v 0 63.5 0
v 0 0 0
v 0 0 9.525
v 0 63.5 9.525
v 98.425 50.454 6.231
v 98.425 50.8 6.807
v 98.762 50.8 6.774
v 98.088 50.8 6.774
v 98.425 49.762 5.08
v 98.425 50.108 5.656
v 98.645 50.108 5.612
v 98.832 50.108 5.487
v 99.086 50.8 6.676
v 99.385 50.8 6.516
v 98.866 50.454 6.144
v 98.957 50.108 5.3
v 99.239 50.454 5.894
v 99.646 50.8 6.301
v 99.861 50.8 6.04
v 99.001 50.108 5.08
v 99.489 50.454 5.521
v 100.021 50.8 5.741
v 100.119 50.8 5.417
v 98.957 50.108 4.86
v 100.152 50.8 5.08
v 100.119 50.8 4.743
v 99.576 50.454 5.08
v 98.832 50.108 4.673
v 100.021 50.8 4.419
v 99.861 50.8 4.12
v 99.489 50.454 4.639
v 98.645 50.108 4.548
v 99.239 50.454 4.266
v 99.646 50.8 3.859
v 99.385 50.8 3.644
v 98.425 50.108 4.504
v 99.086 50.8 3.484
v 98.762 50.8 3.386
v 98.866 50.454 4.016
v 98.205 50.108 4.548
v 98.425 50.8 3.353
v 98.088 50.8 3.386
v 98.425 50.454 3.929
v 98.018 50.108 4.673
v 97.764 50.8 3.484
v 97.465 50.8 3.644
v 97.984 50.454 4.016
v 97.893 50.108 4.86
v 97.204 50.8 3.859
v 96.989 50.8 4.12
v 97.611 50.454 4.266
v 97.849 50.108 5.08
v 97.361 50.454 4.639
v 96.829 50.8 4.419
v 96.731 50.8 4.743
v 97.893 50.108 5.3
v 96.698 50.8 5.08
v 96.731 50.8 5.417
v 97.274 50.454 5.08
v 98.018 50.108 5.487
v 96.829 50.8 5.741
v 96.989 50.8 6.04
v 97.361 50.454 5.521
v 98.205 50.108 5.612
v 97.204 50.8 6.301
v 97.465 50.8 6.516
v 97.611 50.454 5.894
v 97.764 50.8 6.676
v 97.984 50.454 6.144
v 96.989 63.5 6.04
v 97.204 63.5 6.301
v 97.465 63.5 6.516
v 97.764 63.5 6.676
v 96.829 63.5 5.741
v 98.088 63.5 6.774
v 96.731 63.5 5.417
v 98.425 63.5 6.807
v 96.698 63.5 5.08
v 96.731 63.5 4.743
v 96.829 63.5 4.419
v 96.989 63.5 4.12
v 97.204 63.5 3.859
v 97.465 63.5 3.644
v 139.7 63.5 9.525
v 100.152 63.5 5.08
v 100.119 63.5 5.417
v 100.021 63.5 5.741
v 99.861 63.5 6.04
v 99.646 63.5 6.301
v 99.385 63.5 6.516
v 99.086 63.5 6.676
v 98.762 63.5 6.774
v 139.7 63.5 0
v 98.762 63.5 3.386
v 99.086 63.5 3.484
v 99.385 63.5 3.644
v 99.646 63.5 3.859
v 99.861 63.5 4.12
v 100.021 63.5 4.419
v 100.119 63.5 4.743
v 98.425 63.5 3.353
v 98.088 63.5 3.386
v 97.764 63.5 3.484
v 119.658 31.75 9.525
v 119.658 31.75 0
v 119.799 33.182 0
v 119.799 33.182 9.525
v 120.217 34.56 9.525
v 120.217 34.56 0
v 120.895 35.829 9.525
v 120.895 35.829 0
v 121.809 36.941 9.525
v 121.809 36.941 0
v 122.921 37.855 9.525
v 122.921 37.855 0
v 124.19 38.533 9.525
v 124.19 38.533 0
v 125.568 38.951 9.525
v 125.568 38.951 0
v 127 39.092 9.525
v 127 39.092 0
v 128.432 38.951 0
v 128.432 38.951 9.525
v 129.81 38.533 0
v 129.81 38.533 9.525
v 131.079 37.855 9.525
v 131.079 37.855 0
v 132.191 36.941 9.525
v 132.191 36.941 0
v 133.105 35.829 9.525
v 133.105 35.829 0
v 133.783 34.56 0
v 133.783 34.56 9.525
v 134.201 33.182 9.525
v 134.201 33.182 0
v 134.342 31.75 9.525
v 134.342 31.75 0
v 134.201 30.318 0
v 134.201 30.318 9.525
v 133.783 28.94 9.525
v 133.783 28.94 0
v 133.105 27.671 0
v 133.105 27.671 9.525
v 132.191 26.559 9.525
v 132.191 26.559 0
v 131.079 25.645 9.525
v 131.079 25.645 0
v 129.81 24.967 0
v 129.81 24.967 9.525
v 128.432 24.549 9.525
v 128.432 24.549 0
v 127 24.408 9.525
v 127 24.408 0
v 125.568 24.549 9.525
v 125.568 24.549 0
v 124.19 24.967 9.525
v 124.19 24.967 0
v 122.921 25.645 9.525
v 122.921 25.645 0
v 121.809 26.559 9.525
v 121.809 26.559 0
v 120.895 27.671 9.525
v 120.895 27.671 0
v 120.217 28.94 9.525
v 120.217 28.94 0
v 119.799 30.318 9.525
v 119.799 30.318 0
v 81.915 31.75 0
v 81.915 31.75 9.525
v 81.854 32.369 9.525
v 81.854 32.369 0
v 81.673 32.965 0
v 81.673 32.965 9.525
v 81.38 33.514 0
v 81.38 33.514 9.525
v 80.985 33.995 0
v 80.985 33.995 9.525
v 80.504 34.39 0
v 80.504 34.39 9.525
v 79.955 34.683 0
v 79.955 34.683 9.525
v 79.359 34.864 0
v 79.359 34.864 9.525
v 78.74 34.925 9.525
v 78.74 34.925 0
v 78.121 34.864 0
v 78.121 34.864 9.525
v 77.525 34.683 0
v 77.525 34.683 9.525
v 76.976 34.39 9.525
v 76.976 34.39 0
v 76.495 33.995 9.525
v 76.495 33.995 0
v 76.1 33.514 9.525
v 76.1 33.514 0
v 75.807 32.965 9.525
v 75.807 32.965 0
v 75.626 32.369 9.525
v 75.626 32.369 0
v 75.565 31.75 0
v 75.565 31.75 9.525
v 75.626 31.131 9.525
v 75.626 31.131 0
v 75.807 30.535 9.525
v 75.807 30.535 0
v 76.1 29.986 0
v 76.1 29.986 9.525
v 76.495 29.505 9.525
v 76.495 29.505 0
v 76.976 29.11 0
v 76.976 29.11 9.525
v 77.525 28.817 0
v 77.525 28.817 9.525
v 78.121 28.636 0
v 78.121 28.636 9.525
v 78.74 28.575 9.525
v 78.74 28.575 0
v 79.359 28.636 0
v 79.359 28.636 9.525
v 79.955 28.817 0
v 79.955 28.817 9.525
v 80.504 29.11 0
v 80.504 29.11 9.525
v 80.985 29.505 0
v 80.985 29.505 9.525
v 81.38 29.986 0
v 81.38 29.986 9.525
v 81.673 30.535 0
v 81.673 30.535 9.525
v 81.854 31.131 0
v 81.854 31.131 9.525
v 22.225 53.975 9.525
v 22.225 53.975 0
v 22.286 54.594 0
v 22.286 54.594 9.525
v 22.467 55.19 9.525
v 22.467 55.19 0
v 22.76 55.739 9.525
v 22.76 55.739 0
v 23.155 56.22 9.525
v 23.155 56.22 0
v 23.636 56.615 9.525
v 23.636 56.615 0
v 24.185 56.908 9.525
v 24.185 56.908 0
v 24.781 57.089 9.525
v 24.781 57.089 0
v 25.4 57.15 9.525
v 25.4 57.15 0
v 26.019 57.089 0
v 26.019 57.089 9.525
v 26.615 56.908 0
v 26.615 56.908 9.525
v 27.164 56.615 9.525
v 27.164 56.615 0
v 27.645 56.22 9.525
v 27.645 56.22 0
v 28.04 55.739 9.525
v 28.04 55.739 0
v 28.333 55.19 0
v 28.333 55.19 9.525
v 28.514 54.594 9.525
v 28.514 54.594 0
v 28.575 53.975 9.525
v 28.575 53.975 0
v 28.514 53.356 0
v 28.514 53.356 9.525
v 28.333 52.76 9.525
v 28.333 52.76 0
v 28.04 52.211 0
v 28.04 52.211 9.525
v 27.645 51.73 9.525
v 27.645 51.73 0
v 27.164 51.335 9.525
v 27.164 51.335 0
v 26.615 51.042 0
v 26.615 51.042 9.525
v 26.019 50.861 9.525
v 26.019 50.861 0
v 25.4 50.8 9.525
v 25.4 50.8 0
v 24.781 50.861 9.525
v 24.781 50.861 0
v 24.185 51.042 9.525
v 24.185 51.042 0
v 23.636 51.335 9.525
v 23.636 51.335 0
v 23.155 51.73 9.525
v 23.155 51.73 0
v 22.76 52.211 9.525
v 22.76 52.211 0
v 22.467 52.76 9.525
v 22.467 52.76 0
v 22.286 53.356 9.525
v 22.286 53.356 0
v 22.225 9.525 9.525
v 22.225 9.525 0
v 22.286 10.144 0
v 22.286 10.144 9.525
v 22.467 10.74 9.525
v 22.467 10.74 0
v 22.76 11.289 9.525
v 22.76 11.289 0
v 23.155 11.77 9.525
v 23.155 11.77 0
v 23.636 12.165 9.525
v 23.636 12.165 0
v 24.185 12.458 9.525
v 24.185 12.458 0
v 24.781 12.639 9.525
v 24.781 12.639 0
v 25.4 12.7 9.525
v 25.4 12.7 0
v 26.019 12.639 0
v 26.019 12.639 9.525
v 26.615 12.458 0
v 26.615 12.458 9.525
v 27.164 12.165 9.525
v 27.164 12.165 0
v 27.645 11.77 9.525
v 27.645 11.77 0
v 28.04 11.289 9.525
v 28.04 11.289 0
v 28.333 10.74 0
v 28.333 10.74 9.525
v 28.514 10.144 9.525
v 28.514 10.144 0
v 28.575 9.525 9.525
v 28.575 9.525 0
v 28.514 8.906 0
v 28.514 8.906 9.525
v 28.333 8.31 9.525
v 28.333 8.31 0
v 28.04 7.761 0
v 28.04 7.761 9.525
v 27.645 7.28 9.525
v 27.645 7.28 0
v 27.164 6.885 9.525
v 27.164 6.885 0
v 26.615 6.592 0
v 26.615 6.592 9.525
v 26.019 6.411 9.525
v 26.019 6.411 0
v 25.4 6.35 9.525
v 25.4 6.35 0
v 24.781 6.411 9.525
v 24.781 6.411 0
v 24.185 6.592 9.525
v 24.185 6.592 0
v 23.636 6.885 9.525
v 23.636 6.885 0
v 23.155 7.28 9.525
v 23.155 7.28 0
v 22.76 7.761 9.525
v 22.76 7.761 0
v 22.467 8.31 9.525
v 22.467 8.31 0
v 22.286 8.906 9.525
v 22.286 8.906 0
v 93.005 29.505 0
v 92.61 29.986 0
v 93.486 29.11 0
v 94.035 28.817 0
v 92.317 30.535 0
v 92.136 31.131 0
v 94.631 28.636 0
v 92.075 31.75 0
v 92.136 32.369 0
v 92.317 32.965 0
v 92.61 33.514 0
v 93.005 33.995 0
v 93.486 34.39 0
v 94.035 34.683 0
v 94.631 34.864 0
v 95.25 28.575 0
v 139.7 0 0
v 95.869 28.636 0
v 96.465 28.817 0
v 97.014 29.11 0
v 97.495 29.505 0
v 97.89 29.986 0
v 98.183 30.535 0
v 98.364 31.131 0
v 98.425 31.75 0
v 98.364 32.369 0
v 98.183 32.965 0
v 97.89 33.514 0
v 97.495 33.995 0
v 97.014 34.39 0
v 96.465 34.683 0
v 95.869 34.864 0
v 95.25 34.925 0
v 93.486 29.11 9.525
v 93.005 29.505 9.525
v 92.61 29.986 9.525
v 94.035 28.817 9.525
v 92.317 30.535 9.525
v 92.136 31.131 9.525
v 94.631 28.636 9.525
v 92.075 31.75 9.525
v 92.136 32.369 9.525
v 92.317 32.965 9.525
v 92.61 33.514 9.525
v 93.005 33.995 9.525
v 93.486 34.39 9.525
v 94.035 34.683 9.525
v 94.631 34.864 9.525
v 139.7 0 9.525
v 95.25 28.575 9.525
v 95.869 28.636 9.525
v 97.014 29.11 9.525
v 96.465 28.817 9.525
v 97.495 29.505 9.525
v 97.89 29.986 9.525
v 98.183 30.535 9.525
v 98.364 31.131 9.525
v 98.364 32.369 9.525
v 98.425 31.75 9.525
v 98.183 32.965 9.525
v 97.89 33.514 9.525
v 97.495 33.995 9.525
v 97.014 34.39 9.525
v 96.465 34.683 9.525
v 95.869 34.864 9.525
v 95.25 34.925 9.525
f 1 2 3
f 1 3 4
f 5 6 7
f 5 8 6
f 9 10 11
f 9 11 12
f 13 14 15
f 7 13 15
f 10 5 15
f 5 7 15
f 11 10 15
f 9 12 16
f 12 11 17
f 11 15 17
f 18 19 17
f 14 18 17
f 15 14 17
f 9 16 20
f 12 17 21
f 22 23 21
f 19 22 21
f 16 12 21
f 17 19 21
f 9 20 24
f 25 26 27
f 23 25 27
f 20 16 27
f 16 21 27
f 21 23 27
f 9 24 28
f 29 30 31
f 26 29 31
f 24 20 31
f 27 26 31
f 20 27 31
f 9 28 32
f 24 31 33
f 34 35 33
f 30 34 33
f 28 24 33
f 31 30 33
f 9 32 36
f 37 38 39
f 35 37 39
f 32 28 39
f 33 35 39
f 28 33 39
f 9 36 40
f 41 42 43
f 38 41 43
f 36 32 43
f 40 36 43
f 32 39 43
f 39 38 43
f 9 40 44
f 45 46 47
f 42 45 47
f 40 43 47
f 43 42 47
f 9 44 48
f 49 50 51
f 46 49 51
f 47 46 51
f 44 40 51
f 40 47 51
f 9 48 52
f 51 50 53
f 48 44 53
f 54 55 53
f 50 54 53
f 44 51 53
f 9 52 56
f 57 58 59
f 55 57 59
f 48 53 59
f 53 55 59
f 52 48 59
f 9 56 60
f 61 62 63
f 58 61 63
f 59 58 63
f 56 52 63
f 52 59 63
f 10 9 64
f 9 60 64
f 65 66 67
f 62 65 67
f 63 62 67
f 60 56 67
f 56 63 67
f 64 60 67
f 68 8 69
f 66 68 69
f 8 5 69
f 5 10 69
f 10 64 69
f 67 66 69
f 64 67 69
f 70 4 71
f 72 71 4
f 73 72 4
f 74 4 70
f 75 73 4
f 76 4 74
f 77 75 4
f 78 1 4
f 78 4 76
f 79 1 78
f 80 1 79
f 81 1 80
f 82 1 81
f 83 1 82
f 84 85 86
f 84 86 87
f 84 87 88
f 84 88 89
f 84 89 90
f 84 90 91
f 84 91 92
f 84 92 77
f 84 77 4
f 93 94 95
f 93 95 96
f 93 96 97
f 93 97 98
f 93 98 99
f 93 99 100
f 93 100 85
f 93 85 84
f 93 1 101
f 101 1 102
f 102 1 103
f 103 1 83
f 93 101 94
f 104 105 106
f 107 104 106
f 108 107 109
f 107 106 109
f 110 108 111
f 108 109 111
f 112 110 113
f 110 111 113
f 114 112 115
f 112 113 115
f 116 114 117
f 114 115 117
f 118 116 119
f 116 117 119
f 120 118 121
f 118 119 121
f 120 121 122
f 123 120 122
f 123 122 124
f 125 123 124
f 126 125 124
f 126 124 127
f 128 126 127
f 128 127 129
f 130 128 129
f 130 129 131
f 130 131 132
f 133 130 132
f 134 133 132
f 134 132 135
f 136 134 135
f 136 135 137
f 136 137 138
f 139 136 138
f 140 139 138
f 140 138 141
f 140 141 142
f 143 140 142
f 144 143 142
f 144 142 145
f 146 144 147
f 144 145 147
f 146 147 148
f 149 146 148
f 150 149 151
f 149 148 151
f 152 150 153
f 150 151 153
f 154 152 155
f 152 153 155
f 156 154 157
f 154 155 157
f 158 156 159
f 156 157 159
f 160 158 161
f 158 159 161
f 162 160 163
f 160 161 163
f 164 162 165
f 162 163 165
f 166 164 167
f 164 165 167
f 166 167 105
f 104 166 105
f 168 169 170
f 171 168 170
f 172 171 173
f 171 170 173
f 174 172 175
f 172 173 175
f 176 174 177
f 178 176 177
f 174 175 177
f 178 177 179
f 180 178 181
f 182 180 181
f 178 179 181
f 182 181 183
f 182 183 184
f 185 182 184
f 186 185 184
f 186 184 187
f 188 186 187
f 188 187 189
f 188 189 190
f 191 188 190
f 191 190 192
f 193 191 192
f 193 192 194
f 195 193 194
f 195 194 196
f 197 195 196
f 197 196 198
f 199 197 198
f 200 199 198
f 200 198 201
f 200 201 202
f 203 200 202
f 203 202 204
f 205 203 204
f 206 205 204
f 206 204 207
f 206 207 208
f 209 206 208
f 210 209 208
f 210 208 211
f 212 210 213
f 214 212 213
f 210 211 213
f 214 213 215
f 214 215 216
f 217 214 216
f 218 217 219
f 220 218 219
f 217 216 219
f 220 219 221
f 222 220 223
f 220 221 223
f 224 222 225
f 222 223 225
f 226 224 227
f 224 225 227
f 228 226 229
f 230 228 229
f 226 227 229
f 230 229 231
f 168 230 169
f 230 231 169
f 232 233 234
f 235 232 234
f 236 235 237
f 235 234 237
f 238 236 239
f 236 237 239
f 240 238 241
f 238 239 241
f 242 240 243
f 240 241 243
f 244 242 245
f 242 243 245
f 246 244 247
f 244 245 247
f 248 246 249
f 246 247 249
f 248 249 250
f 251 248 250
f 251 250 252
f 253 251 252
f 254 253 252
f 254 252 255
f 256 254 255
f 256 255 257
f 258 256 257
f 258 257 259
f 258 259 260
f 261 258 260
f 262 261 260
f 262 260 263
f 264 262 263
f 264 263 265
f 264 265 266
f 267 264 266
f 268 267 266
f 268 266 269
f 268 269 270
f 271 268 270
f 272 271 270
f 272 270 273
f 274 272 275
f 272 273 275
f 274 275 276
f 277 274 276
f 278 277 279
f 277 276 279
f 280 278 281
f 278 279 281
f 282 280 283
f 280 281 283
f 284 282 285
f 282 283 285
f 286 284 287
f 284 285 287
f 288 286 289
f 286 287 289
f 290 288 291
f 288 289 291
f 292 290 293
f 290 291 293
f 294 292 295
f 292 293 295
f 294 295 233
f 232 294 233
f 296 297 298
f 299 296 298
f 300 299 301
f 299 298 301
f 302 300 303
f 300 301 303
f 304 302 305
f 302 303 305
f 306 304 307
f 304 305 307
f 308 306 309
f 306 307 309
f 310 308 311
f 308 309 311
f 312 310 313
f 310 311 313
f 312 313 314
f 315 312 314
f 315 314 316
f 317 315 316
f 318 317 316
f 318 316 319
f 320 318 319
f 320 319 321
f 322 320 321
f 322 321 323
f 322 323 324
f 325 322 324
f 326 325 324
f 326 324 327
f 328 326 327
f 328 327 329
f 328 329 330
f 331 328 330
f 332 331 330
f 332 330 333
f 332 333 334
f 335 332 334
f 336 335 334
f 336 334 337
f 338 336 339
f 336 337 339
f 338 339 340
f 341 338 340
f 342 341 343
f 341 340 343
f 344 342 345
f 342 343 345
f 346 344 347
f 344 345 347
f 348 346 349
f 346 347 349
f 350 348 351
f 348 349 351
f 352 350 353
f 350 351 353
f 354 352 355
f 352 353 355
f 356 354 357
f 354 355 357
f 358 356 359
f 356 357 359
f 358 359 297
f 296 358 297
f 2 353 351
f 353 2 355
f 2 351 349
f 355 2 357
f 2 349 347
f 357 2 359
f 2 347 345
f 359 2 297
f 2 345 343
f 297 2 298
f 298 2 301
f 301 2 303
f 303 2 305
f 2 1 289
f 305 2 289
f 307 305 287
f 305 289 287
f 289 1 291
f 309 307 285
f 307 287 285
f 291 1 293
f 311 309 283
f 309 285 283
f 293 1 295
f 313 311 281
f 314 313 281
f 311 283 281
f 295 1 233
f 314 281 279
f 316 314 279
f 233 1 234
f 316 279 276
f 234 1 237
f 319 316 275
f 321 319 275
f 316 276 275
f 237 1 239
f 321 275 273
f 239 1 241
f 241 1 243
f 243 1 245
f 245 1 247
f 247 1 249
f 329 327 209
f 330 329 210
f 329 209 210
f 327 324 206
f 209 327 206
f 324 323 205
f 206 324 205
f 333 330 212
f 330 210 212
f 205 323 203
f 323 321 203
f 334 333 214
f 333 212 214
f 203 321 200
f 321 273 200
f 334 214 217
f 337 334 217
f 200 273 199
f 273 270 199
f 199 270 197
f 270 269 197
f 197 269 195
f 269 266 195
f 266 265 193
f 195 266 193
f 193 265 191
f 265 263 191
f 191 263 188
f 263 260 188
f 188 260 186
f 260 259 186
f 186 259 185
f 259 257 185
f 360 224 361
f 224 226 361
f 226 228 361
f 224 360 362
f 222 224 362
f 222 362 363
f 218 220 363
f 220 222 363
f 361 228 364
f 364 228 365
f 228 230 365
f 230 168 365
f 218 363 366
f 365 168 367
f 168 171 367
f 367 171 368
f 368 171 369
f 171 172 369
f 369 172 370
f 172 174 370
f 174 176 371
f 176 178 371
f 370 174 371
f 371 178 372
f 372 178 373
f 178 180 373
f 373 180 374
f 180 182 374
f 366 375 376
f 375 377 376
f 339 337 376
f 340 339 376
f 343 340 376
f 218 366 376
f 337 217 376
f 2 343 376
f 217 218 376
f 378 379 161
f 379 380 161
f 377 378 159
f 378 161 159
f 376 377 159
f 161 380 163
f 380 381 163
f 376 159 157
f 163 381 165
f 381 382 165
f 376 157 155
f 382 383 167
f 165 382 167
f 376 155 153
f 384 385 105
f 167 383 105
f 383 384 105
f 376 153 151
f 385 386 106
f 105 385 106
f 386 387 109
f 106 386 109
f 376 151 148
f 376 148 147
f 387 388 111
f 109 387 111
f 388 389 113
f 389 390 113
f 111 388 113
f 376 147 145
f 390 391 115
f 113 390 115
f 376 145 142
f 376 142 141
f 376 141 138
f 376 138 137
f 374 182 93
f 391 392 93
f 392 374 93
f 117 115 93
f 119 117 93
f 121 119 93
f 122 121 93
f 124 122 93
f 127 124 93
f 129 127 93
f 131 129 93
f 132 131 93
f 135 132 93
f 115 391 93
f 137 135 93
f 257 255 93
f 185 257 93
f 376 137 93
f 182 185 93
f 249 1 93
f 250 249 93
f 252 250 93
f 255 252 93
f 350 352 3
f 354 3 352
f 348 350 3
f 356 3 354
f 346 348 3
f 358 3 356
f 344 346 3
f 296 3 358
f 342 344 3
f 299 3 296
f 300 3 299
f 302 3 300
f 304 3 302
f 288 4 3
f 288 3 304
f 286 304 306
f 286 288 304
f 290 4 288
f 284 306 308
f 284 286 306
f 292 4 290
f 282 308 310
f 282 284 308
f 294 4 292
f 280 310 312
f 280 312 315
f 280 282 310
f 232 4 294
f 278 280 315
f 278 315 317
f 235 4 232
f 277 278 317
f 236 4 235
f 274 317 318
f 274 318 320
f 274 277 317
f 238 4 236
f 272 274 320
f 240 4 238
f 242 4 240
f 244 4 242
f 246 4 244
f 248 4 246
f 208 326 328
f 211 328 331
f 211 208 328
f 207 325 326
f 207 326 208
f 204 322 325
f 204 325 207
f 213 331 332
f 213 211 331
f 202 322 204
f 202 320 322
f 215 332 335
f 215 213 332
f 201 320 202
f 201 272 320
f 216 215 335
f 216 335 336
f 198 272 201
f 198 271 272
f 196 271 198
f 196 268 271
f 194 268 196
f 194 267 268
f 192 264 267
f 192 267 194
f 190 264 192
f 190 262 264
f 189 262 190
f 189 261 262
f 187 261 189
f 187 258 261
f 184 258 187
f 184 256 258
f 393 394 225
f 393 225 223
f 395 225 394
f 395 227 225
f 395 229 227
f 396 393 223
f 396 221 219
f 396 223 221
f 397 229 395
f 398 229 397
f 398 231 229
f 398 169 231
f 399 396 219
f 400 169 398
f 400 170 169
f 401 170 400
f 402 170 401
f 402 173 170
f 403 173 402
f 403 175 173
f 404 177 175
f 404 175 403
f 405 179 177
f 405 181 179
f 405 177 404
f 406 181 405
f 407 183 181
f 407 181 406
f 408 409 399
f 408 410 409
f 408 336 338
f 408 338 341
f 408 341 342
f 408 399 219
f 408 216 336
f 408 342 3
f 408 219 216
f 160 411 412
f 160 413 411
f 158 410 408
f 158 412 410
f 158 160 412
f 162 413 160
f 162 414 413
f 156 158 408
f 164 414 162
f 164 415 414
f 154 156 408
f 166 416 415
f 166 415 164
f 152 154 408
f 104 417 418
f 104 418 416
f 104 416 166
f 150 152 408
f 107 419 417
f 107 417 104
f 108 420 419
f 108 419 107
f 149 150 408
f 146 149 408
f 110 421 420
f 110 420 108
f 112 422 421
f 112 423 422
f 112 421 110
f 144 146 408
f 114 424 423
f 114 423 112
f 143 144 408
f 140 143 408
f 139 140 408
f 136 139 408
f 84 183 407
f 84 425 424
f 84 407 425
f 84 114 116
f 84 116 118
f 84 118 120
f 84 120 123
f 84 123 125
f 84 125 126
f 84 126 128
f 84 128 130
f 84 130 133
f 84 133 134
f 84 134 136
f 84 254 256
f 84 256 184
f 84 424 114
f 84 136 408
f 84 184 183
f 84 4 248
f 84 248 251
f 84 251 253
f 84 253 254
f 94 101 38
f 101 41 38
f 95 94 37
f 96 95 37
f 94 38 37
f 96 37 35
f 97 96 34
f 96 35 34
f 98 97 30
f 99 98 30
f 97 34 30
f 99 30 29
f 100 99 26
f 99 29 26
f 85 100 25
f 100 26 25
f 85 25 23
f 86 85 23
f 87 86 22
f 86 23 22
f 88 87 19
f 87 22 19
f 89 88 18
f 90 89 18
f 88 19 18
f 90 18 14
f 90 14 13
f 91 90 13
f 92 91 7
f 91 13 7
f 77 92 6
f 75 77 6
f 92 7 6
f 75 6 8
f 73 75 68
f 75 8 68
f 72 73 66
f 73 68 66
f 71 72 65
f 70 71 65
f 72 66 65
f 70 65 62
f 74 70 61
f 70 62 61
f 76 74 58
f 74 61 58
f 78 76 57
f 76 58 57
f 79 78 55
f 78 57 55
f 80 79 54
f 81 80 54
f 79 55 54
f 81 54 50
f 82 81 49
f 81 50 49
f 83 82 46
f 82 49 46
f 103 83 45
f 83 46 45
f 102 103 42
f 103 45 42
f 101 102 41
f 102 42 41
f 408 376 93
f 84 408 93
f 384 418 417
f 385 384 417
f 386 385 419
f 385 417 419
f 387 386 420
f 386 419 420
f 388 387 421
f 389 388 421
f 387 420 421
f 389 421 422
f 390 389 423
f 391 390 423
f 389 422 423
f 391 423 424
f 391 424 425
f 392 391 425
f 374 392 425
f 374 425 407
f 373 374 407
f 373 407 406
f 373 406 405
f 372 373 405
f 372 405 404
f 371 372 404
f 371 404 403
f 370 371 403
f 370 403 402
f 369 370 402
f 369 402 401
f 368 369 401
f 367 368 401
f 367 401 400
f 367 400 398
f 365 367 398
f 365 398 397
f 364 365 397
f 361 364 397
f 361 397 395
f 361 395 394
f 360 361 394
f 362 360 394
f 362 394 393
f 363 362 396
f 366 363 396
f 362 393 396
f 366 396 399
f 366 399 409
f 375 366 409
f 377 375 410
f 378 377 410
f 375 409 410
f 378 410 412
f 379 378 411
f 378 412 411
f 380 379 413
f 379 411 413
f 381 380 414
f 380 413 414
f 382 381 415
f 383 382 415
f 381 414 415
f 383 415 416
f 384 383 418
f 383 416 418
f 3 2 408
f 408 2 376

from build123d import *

# Parameters (mm, degrees)
SKETCH1_W                   = 139.7
SKETCH1_H                   = 63.5
BOSS_EXTRUDE1_DEPTH         = 9.525
F_5_8_18_TAPPED_HOLE1_D     = 14.68374
F_1_4_0_25_DIAMETER_HOLE1_D = 6.35
F_8_32_TAPPED_HOLE1_D       = 3.4544
F_8_32_TAPPED_HOLE1_DEPTH   = 12.7
F_8_32_TAPPED_HOLE1_TIP     = 1.037806461
SKETCH9_R                   = 3.175
CUT_EXTRUDE1_DEPTH          = 10.525


with BuildPart() as part:
    # Sketch1 → Boss-Extrude1 (new body)
    with BuildSketch(Plane.XY):
        with Locations((69.85, 31.75)):
            Rectangle(SKETCH1_W, SKETCH1_H)
    extrude(amount=BOSS_EXTRUDE1_DEPTH)

    # 5/8-18 Tapped Hole1 (through all)
    with Locations(Plane.XY.offset(9.525)):
        with Locations((127, 31.75)):
            Hole(F_5_8_18_TAPPED_HOLE1_D / 2)

    # 1/4 (0.25) Diameter Hole1 (through all)
    with Locations(Plane(origin=(25.4, 53.975, 9.525), x_dir=(1, 0, 0), z_dir=(0, 0, 1))):
        with Locations((0, 0), (0, -44.45)):
            Hole(F_1_4_0_25_DIAMETER_HOLE1_D / 2)

    # #8-32 Tapped Hole1
    with Locations(Plane(origin=(98.425, 63.5, 5.08), x_dir=(0, 0, 1), z_dir=(0, 1, 0))):
        with Locations((0, 0)):
            Hole(F_8_32_TAPPED_HOLE1_D / 2, depth=F_8_32_TAPPED_HOLE1_DEPTH)
            with Locations((0, 0, -(F_8_32_TAPPED_HOLE1_DEPTH + F_8_32_TAPPED_HOLE1_TIP / 2))):  # 118° drill point
                Cone(0, F_8_32_TAPPED_HOLE1_D / 2, F_8_32_TAPPED_HOLE1_TIP, mode=Mode.SUBTRACT)

    # Sketch9 → Cut-Extrude1 (cut, through all)
    with BuildSketch(Plane.XY.offset(9.525)):
        with Locations((95.25, 31.75)):
            Circle(SKETCH9_R)
        with Locations((78.74, 31.75)):
            Circle(SKETCH9_R)
    extrude(amount=-CUT_EXTRUDE1_DEPTH, mode=Mode.SUBTRACT)


solid = part.part
